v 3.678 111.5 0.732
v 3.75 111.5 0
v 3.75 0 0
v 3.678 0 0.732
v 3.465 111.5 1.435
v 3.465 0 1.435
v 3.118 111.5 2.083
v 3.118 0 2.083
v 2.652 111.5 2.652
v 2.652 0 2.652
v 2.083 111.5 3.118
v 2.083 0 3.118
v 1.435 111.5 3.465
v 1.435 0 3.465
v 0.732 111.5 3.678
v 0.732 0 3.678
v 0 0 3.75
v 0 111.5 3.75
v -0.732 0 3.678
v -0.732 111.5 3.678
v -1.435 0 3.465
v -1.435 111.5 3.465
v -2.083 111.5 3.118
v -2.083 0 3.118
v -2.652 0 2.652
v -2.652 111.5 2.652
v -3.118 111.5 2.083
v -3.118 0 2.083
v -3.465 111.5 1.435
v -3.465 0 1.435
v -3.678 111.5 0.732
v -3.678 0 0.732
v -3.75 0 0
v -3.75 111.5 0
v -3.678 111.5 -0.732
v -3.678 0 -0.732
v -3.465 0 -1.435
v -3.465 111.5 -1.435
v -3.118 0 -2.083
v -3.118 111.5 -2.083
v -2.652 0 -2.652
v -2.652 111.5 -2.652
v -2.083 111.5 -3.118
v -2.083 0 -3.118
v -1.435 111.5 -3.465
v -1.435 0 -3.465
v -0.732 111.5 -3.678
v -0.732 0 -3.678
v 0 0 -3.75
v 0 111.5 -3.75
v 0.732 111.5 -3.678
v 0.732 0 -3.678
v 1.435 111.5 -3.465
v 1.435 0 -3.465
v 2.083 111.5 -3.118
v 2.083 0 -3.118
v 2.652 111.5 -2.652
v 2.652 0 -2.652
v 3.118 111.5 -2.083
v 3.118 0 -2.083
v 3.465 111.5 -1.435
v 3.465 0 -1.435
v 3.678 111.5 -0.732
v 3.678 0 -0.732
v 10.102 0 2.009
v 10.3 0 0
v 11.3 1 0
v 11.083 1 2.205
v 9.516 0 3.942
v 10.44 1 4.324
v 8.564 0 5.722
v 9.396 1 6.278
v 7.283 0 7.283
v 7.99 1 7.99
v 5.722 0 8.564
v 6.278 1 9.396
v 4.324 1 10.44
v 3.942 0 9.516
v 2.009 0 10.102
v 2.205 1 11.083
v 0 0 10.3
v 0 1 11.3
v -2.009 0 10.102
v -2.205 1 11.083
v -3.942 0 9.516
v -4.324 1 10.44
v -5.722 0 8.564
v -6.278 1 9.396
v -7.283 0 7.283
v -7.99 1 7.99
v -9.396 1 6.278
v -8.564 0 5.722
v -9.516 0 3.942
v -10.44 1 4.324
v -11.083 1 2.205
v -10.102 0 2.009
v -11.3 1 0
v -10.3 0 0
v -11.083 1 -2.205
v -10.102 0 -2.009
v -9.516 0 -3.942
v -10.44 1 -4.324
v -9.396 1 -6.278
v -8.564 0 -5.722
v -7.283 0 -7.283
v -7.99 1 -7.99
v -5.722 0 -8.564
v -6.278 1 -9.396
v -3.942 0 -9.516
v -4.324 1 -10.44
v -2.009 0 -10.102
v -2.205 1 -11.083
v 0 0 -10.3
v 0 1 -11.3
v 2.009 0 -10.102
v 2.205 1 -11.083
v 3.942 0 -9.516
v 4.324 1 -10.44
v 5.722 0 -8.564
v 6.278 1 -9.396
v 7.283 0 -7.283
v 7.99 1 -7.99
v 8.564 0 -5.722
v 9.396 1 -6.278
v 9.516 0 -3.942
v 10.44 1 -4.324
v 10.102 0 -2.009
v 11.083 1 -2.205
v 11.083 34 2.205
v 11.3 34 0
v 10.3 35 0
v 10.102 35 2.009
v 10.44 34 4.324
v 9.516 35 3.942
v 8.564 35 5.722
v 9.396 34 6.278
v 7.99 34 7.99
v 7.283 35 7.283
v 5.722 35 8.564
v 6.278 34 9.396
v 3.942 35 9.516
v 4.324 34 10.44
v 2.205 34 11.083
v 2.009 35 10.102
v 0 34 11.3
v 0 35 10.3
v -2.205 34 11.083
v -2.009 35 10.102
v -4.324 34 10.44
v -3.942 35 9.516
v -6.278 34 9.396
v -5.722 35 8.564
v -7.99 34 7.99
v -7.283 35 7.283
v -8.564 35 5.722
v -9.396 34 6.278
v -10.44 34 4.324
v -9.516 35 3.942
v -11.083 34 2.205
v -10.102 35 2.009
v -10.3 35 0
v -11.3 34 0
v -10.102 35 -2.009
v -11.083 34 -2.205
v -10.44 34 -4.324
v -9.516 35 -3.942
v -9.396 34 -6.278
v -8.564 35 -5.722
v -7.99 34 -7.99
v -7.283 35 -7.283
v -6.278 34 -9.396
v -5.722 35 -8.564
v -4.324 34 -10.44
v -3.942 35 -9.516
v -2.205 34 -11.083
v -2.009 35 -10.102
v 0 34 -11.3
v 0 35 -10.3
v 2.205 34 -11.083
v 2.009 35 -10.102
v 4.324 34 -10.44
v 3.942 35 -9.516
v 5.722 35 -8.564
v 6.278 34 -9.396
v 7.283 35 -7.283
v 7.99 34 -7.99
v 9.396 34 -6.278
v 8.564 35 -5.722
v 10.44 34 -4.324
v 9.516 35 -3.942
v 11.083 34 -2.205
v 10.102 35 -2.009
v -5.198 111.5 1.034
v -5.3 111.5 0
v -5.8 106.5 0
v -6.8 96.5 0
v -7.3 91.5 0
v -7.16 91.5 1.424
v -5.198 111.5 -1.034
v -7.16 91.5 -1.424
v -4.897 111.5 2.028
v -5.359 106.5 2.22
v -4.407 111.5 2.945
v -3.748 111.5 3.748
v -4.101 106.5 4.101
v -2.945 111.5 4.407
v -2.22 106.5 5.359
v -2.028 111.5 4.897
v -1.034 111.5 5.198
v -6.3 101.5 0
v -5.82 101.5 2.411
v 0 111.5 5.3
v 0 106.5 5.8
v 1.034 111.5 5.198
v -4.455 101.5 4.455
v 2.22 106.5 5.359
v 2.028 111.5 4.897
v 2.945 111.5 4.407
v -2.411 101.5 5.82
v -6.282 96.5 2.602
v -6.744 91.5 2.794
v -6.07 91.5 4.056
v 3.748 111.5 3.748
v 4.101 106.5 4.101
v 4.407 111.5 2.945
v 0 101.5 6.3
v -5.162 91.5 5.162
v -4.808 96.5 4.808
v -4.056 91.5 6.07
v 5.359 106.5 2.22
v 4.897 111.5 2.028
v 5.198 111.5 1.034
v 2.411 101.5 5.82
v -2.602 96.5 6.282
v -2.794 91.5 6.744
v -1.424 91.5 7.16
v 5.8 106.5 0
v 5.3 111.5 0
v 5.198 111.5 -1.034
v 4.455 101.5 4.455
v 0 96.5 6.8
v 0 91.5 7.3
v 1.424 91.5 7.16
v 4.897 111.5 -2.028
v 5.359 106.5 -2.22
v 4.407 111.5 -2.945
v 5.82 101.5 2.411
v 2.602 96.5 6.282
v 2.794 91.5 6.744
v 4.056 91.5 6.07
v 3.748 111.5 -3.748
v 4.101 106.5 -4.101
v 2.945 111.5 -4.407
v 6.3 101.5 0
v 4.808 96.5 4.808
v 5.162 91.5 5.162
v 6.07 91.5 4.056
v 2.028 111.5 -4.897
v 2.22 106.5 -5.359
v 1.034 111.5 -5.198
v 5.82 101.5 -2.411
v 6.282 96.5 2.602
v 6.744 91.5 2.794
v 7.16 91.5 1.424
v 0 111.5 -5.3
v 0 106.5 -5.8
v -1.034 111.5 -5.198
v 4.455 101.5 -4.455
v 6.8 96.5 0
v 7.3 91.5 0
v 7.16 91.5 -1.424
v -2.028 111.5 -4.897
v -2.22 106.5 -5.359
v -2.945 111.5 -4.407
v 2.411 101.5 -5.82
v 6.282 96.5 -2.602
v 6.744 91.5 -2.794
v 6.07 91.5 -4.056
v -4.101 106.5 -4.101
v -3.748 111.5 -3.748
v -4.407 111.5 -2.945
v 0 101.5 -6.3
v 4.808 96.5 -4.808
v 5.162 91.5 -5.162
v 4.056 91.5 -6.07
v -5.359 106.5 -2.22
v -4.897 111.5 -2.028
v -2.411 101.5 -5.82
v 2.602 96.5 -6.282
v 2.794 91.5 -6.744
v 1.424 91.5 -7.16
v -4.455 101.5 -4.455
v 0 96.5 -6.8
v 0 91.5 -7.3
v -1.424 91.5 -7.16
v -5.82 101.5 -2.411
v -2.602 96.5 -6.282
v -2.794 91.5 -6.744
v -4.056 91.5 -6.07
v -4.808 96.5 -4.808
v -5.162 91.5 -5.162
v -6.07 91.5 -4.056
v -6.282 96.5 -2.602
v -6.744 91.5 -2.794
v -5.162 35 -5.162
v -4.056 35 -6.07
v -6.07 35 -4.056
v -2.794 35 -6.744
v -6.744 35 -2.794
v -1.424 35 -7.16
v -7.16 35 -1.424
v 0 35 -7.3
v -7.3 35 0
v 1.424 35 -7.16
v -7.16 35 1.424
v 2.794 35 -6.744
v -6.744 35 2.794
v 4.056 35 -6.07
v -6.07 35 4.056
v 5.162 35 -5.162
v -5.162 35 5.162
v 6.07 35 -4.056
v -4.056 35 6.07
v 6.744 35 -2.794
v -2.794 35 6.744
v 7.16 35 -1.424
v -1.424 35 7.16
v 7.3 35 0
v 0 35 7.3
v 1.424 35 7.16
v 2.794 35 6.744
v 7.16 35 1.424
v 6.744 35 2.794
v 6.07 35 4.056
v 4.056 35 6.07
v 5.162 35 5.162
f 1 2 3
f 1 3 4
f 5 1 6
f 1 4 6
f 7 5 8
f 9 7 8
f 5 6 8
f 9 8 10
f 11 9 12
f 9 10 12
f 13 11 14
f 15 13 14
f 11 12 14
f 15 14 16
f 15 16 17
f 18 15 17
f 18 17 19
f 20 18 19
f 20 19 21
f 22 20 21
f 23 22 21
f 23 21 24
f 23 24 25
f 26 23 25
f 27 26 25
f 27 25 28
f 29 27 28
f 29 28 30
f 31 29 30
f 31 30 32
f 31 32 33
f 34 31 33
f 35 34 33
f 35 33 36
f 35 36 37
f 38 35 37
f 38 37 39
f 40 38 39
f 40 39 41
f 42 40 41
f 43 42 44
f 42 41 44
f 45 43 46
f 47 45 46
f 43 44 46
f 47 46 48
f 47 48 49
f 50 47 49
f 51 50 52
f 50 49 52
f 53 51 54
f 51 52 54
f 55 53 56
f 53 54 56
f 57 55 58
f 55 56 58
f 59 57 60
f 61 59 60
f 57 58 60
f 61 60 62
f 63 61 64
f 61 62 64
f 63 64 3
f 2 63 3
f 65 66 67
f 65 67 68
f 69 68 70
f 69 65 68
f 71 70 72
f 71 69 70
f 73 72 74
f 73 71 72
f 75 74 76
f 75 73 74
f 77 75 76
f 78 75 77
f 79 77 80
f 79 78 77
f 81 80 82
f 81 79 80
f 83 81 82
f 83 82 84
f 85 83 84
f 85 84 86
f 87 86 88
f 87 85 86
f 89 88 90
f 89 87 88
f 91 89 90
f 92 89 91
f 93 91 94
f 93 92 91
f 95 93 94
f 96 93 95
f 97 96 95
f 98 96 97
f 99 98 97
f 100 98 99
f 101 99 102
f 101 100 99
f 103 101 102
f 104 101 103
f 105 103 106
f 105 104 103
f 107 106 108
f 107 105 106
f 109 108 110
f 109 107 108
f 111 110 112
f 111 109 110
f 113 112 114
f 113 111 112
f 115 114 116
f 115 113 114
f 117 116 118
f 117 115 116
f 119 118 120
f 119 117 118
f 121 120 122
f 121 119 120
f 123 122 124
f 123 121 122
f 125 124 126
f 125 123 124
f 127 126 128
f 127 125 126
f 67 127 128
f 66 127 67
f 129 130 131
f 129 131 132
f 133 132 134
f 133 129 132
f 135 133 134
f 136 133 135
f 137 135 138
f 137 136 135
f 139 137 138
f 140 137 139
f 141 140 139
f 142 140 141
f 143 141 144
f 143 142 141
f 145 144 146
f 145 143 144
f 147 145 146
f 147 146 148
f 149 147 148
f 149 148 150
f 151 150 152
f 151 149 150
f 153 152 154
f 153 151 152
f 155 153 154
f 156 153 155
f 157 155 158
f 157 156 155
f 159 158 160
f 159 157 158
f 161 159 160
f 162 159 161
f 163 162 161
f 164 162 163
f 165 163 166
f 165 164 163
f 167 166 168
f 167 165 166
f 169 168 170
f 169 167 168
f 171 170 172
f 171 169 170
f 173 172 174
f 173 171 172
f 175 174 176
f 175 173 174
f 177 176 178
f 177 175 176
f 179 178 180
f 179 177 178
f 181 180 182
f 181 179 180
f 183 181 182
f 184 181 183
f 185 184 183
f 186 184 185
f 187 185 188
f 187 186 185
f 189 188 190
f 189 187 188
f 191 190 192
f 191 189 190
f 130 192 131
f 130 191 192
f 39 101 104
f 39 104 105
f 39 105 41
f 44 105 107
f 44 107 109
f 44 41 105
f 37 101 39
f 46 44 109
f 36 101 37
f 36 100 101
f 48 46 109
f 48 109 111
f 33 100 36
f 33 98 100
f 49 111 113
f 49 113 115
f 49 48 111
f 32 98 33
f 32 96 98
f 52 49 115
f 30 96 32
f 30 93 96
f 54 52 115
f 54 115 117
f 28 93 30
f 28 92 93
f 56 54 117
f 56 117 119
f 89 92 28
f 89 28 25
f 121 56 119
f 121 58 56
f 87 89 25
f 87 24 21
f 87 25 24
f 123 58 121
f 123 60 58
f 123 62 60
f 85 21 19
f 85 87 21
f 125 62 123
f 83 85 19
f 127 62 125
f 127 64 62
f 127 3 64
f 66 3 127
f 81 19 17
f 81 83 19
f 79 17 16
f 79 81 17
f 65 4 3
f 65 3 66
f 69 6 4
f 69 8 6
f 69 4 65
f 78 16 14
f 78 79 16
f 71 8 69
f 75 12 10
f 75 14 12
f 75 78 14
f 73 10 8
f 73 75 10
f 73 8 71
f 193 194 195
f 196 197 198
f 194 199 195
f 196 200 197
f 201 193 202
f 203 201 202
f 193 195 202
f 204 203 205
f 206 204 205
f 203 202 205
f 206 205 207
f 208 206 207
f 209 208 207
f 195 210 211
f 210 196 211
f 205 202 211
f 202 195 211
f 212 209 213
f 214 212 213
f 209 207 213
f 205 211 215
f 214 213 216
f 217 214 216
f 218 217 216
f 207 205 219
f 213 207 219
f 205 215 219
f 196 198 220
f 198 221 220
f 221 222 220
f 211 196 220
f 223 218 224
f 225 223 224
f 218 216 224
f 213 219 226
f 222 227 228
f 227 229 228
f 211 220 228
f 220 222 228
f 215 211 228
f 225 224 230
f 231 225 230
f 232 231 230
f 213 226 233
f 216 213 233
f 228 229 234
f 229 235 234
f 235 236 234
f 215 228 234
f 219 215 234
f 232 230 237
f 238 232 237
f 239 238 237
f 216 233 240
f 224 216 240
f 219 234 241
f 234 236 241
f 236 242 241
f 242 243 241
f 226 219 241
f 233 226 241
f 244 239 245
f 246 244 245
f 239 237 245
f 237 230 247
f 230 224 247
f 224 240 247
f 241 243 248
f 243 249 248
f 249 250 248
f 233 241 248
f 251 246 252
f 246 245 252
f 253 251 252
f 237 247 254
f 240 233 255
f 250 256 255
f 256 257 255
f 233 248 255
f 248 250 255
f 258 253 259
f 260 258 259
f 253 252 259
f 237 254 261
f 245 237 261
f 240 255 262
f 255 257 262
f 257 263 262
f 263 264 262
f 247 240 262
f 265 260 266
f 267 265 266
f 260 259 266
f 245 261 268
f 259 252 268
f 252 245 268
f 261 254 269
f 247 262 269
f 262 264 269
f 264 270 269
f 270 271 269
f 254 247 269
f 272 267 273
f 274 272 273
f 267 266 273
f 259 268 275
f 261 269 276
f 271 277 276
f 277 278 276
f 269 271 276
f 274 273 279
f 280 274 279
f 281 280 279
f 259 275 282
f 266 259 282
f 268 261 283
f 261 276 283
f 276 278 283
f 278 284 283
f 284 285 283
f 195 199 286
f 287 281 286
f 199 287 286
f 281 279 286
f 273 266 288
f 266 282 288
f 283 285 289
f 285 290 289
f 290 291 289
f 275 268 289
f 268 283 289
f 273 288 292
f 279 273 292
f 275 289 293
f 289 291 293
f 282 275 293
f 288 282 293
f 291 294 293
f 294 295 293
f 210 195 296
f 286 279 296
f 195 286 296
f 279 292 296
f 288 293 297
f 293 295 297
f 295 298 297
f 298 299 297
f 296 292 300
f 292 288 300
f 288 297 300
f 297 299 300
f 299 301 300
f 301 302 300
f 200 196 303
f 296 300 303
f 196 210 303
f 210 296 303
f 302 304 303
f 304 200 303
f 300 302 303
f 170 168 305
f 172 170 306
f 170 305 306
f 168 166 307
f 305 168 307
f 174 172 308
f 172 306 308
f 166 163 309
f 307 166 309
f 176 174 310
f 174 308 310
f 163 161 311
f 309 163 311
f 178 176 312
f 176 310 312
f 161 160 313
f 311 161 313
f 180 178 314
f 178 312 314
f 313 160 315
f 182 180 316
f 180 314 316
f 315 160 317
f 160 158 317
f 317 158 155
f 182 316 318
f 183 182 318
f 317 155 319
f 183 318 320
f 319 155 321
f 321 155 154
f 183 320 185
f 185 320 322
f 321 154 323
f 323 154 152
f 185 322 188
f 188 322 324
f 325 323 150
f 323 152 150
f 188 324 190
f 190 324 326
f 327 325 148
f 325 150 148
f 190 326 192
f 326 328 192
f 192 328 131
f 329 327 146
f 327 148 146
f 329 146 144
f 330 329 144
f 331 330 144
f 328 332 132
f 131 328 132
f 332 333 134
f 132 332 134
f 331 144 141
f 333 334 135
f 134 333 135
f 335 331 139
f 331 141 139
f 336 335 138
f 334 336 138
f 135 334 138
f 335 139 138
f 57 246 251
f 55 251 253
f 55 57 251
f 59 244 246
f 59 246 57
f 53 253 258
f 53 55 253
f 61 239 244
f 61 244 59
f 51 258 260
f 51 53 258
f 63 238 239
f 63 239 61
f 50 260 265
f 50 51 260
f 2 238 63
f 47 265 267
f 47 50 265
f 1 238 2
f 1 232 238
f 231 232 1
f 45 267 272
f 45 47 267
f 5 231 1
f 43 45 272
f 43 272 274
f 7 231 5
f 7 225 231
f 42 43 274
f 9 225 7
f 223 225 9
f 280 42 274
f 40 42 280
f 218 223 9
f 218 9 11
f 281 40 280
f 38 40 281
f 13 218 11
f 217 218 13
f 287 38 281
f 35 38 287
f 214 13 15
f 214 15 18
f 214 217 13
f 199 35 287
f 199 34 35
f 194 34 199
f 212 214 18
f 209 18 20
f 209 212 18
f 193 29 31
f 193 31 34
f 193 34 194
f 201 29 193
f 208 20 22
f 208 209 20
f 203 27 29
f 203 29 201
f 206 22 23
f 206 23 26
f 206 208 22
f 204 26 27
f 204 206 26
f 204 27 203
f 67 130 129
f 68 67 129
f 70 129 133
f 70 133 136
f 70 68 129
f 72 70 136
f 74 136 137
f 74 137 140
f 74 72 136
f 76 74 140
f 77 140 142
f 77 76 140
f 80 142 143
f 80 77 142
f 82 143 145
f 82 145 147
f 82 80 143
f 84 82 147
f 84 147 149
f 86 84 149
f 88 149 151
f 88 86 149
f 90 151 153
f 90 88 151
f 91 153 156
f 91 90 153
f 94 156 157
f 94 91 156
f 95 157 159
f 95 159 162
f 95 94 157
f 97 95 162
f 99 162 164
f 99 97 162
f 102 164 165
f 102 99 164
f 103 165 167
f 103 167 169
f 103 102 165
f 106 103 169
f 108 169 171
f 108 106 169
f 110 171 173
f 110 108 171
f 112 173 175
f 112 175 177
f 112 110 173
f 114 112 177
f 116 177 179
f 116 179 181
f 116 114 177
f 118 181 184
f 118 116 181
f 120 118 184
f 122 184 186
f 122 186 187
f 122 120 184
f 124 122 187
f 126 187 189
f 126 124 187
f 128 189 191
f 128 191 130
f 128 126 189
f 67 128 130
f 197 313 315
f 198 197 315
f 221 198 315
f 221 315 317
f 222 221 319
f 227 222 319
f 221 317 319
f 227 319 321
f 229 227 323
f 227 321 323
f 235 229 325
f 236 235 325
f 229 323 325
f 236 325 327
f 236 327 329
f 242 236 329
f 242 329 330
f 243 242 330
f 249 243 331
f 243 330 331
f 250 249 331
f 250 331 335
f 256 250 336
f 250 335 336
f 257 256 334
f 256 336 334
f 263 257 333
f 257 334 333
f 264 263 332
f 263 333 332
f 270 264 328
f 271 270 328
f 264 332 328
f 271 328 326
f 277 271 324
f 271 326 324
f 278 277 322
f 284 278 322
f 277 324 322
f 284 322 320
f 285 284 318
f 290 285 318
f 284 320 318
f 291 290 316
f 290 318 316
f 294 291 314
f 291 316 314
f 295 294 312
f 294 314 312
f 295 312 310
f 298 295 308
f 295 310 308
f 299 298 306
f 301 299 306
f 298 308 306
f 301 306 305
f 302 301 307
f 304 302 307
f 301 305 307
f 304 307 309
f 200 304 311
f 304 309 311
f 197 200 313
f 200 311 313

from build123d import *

# Parameters (mm, degrees)
F0_R     = 11.3
F1_DEPTH = 35
F2_SIZE  = 1
F3_R     = 7.3
F4_DEPTH = 76.5
F5_SIZE2 = 20
F5_SIZE  = 2
F6_R     = 3.75
F7_DEPTH = 111.501
F8_SIZE  = 1


with BuildPart() as f1:
    # F0 (on Front) → F1 (new body)
    with BuildSketch(Plane.XZ):
        Circle(F0_R)
    extrude(amount=-F1_DEPTH)

    # F2
    f2_edges = [f1.edges().sort_by_distance(p)[0] for p in [
        (-11.3, 0, 0),
    ]]
    chamfer(f2_edges, length=F2_SIZE)

    # F3 (on face) → F4 (join)
    with BuildSketch(Plane(origin=(0, 35, 0), x_dir=(-1, 0, 0), z_dir=(0, 1, 0))):
        Circle(F3_R)
    extrude(amount=F4_DEPTH)

    # F5
    f5_edges = [f1.edges().sort_by_distance(p)[0] for p in [
        (7.3, 111.5, 0),
    ]]
    f5_side = f1.faces().sort_by_distance((0, 111.5, 0))[0]
    chamfer(f5_edges, length=F5_SIZE, length2=F5_SIZE2, reference=f5_side)

    # F6 (on face) → F7 (cut, through all)
    with BuildSketch(Plane.XZ):
        Circle(F6_R)
    extrude(amount=-F7_DEPTH, mode=Mode.SUBTRACT)

    # F8
    f8_edges = [f1.edges().sort_by_distance(p)[0] for p in [
        (-11.3, 35, 0),
    ]]
    chamfer(f8_edges, length=F8_SIZE)


solid = f1.part
